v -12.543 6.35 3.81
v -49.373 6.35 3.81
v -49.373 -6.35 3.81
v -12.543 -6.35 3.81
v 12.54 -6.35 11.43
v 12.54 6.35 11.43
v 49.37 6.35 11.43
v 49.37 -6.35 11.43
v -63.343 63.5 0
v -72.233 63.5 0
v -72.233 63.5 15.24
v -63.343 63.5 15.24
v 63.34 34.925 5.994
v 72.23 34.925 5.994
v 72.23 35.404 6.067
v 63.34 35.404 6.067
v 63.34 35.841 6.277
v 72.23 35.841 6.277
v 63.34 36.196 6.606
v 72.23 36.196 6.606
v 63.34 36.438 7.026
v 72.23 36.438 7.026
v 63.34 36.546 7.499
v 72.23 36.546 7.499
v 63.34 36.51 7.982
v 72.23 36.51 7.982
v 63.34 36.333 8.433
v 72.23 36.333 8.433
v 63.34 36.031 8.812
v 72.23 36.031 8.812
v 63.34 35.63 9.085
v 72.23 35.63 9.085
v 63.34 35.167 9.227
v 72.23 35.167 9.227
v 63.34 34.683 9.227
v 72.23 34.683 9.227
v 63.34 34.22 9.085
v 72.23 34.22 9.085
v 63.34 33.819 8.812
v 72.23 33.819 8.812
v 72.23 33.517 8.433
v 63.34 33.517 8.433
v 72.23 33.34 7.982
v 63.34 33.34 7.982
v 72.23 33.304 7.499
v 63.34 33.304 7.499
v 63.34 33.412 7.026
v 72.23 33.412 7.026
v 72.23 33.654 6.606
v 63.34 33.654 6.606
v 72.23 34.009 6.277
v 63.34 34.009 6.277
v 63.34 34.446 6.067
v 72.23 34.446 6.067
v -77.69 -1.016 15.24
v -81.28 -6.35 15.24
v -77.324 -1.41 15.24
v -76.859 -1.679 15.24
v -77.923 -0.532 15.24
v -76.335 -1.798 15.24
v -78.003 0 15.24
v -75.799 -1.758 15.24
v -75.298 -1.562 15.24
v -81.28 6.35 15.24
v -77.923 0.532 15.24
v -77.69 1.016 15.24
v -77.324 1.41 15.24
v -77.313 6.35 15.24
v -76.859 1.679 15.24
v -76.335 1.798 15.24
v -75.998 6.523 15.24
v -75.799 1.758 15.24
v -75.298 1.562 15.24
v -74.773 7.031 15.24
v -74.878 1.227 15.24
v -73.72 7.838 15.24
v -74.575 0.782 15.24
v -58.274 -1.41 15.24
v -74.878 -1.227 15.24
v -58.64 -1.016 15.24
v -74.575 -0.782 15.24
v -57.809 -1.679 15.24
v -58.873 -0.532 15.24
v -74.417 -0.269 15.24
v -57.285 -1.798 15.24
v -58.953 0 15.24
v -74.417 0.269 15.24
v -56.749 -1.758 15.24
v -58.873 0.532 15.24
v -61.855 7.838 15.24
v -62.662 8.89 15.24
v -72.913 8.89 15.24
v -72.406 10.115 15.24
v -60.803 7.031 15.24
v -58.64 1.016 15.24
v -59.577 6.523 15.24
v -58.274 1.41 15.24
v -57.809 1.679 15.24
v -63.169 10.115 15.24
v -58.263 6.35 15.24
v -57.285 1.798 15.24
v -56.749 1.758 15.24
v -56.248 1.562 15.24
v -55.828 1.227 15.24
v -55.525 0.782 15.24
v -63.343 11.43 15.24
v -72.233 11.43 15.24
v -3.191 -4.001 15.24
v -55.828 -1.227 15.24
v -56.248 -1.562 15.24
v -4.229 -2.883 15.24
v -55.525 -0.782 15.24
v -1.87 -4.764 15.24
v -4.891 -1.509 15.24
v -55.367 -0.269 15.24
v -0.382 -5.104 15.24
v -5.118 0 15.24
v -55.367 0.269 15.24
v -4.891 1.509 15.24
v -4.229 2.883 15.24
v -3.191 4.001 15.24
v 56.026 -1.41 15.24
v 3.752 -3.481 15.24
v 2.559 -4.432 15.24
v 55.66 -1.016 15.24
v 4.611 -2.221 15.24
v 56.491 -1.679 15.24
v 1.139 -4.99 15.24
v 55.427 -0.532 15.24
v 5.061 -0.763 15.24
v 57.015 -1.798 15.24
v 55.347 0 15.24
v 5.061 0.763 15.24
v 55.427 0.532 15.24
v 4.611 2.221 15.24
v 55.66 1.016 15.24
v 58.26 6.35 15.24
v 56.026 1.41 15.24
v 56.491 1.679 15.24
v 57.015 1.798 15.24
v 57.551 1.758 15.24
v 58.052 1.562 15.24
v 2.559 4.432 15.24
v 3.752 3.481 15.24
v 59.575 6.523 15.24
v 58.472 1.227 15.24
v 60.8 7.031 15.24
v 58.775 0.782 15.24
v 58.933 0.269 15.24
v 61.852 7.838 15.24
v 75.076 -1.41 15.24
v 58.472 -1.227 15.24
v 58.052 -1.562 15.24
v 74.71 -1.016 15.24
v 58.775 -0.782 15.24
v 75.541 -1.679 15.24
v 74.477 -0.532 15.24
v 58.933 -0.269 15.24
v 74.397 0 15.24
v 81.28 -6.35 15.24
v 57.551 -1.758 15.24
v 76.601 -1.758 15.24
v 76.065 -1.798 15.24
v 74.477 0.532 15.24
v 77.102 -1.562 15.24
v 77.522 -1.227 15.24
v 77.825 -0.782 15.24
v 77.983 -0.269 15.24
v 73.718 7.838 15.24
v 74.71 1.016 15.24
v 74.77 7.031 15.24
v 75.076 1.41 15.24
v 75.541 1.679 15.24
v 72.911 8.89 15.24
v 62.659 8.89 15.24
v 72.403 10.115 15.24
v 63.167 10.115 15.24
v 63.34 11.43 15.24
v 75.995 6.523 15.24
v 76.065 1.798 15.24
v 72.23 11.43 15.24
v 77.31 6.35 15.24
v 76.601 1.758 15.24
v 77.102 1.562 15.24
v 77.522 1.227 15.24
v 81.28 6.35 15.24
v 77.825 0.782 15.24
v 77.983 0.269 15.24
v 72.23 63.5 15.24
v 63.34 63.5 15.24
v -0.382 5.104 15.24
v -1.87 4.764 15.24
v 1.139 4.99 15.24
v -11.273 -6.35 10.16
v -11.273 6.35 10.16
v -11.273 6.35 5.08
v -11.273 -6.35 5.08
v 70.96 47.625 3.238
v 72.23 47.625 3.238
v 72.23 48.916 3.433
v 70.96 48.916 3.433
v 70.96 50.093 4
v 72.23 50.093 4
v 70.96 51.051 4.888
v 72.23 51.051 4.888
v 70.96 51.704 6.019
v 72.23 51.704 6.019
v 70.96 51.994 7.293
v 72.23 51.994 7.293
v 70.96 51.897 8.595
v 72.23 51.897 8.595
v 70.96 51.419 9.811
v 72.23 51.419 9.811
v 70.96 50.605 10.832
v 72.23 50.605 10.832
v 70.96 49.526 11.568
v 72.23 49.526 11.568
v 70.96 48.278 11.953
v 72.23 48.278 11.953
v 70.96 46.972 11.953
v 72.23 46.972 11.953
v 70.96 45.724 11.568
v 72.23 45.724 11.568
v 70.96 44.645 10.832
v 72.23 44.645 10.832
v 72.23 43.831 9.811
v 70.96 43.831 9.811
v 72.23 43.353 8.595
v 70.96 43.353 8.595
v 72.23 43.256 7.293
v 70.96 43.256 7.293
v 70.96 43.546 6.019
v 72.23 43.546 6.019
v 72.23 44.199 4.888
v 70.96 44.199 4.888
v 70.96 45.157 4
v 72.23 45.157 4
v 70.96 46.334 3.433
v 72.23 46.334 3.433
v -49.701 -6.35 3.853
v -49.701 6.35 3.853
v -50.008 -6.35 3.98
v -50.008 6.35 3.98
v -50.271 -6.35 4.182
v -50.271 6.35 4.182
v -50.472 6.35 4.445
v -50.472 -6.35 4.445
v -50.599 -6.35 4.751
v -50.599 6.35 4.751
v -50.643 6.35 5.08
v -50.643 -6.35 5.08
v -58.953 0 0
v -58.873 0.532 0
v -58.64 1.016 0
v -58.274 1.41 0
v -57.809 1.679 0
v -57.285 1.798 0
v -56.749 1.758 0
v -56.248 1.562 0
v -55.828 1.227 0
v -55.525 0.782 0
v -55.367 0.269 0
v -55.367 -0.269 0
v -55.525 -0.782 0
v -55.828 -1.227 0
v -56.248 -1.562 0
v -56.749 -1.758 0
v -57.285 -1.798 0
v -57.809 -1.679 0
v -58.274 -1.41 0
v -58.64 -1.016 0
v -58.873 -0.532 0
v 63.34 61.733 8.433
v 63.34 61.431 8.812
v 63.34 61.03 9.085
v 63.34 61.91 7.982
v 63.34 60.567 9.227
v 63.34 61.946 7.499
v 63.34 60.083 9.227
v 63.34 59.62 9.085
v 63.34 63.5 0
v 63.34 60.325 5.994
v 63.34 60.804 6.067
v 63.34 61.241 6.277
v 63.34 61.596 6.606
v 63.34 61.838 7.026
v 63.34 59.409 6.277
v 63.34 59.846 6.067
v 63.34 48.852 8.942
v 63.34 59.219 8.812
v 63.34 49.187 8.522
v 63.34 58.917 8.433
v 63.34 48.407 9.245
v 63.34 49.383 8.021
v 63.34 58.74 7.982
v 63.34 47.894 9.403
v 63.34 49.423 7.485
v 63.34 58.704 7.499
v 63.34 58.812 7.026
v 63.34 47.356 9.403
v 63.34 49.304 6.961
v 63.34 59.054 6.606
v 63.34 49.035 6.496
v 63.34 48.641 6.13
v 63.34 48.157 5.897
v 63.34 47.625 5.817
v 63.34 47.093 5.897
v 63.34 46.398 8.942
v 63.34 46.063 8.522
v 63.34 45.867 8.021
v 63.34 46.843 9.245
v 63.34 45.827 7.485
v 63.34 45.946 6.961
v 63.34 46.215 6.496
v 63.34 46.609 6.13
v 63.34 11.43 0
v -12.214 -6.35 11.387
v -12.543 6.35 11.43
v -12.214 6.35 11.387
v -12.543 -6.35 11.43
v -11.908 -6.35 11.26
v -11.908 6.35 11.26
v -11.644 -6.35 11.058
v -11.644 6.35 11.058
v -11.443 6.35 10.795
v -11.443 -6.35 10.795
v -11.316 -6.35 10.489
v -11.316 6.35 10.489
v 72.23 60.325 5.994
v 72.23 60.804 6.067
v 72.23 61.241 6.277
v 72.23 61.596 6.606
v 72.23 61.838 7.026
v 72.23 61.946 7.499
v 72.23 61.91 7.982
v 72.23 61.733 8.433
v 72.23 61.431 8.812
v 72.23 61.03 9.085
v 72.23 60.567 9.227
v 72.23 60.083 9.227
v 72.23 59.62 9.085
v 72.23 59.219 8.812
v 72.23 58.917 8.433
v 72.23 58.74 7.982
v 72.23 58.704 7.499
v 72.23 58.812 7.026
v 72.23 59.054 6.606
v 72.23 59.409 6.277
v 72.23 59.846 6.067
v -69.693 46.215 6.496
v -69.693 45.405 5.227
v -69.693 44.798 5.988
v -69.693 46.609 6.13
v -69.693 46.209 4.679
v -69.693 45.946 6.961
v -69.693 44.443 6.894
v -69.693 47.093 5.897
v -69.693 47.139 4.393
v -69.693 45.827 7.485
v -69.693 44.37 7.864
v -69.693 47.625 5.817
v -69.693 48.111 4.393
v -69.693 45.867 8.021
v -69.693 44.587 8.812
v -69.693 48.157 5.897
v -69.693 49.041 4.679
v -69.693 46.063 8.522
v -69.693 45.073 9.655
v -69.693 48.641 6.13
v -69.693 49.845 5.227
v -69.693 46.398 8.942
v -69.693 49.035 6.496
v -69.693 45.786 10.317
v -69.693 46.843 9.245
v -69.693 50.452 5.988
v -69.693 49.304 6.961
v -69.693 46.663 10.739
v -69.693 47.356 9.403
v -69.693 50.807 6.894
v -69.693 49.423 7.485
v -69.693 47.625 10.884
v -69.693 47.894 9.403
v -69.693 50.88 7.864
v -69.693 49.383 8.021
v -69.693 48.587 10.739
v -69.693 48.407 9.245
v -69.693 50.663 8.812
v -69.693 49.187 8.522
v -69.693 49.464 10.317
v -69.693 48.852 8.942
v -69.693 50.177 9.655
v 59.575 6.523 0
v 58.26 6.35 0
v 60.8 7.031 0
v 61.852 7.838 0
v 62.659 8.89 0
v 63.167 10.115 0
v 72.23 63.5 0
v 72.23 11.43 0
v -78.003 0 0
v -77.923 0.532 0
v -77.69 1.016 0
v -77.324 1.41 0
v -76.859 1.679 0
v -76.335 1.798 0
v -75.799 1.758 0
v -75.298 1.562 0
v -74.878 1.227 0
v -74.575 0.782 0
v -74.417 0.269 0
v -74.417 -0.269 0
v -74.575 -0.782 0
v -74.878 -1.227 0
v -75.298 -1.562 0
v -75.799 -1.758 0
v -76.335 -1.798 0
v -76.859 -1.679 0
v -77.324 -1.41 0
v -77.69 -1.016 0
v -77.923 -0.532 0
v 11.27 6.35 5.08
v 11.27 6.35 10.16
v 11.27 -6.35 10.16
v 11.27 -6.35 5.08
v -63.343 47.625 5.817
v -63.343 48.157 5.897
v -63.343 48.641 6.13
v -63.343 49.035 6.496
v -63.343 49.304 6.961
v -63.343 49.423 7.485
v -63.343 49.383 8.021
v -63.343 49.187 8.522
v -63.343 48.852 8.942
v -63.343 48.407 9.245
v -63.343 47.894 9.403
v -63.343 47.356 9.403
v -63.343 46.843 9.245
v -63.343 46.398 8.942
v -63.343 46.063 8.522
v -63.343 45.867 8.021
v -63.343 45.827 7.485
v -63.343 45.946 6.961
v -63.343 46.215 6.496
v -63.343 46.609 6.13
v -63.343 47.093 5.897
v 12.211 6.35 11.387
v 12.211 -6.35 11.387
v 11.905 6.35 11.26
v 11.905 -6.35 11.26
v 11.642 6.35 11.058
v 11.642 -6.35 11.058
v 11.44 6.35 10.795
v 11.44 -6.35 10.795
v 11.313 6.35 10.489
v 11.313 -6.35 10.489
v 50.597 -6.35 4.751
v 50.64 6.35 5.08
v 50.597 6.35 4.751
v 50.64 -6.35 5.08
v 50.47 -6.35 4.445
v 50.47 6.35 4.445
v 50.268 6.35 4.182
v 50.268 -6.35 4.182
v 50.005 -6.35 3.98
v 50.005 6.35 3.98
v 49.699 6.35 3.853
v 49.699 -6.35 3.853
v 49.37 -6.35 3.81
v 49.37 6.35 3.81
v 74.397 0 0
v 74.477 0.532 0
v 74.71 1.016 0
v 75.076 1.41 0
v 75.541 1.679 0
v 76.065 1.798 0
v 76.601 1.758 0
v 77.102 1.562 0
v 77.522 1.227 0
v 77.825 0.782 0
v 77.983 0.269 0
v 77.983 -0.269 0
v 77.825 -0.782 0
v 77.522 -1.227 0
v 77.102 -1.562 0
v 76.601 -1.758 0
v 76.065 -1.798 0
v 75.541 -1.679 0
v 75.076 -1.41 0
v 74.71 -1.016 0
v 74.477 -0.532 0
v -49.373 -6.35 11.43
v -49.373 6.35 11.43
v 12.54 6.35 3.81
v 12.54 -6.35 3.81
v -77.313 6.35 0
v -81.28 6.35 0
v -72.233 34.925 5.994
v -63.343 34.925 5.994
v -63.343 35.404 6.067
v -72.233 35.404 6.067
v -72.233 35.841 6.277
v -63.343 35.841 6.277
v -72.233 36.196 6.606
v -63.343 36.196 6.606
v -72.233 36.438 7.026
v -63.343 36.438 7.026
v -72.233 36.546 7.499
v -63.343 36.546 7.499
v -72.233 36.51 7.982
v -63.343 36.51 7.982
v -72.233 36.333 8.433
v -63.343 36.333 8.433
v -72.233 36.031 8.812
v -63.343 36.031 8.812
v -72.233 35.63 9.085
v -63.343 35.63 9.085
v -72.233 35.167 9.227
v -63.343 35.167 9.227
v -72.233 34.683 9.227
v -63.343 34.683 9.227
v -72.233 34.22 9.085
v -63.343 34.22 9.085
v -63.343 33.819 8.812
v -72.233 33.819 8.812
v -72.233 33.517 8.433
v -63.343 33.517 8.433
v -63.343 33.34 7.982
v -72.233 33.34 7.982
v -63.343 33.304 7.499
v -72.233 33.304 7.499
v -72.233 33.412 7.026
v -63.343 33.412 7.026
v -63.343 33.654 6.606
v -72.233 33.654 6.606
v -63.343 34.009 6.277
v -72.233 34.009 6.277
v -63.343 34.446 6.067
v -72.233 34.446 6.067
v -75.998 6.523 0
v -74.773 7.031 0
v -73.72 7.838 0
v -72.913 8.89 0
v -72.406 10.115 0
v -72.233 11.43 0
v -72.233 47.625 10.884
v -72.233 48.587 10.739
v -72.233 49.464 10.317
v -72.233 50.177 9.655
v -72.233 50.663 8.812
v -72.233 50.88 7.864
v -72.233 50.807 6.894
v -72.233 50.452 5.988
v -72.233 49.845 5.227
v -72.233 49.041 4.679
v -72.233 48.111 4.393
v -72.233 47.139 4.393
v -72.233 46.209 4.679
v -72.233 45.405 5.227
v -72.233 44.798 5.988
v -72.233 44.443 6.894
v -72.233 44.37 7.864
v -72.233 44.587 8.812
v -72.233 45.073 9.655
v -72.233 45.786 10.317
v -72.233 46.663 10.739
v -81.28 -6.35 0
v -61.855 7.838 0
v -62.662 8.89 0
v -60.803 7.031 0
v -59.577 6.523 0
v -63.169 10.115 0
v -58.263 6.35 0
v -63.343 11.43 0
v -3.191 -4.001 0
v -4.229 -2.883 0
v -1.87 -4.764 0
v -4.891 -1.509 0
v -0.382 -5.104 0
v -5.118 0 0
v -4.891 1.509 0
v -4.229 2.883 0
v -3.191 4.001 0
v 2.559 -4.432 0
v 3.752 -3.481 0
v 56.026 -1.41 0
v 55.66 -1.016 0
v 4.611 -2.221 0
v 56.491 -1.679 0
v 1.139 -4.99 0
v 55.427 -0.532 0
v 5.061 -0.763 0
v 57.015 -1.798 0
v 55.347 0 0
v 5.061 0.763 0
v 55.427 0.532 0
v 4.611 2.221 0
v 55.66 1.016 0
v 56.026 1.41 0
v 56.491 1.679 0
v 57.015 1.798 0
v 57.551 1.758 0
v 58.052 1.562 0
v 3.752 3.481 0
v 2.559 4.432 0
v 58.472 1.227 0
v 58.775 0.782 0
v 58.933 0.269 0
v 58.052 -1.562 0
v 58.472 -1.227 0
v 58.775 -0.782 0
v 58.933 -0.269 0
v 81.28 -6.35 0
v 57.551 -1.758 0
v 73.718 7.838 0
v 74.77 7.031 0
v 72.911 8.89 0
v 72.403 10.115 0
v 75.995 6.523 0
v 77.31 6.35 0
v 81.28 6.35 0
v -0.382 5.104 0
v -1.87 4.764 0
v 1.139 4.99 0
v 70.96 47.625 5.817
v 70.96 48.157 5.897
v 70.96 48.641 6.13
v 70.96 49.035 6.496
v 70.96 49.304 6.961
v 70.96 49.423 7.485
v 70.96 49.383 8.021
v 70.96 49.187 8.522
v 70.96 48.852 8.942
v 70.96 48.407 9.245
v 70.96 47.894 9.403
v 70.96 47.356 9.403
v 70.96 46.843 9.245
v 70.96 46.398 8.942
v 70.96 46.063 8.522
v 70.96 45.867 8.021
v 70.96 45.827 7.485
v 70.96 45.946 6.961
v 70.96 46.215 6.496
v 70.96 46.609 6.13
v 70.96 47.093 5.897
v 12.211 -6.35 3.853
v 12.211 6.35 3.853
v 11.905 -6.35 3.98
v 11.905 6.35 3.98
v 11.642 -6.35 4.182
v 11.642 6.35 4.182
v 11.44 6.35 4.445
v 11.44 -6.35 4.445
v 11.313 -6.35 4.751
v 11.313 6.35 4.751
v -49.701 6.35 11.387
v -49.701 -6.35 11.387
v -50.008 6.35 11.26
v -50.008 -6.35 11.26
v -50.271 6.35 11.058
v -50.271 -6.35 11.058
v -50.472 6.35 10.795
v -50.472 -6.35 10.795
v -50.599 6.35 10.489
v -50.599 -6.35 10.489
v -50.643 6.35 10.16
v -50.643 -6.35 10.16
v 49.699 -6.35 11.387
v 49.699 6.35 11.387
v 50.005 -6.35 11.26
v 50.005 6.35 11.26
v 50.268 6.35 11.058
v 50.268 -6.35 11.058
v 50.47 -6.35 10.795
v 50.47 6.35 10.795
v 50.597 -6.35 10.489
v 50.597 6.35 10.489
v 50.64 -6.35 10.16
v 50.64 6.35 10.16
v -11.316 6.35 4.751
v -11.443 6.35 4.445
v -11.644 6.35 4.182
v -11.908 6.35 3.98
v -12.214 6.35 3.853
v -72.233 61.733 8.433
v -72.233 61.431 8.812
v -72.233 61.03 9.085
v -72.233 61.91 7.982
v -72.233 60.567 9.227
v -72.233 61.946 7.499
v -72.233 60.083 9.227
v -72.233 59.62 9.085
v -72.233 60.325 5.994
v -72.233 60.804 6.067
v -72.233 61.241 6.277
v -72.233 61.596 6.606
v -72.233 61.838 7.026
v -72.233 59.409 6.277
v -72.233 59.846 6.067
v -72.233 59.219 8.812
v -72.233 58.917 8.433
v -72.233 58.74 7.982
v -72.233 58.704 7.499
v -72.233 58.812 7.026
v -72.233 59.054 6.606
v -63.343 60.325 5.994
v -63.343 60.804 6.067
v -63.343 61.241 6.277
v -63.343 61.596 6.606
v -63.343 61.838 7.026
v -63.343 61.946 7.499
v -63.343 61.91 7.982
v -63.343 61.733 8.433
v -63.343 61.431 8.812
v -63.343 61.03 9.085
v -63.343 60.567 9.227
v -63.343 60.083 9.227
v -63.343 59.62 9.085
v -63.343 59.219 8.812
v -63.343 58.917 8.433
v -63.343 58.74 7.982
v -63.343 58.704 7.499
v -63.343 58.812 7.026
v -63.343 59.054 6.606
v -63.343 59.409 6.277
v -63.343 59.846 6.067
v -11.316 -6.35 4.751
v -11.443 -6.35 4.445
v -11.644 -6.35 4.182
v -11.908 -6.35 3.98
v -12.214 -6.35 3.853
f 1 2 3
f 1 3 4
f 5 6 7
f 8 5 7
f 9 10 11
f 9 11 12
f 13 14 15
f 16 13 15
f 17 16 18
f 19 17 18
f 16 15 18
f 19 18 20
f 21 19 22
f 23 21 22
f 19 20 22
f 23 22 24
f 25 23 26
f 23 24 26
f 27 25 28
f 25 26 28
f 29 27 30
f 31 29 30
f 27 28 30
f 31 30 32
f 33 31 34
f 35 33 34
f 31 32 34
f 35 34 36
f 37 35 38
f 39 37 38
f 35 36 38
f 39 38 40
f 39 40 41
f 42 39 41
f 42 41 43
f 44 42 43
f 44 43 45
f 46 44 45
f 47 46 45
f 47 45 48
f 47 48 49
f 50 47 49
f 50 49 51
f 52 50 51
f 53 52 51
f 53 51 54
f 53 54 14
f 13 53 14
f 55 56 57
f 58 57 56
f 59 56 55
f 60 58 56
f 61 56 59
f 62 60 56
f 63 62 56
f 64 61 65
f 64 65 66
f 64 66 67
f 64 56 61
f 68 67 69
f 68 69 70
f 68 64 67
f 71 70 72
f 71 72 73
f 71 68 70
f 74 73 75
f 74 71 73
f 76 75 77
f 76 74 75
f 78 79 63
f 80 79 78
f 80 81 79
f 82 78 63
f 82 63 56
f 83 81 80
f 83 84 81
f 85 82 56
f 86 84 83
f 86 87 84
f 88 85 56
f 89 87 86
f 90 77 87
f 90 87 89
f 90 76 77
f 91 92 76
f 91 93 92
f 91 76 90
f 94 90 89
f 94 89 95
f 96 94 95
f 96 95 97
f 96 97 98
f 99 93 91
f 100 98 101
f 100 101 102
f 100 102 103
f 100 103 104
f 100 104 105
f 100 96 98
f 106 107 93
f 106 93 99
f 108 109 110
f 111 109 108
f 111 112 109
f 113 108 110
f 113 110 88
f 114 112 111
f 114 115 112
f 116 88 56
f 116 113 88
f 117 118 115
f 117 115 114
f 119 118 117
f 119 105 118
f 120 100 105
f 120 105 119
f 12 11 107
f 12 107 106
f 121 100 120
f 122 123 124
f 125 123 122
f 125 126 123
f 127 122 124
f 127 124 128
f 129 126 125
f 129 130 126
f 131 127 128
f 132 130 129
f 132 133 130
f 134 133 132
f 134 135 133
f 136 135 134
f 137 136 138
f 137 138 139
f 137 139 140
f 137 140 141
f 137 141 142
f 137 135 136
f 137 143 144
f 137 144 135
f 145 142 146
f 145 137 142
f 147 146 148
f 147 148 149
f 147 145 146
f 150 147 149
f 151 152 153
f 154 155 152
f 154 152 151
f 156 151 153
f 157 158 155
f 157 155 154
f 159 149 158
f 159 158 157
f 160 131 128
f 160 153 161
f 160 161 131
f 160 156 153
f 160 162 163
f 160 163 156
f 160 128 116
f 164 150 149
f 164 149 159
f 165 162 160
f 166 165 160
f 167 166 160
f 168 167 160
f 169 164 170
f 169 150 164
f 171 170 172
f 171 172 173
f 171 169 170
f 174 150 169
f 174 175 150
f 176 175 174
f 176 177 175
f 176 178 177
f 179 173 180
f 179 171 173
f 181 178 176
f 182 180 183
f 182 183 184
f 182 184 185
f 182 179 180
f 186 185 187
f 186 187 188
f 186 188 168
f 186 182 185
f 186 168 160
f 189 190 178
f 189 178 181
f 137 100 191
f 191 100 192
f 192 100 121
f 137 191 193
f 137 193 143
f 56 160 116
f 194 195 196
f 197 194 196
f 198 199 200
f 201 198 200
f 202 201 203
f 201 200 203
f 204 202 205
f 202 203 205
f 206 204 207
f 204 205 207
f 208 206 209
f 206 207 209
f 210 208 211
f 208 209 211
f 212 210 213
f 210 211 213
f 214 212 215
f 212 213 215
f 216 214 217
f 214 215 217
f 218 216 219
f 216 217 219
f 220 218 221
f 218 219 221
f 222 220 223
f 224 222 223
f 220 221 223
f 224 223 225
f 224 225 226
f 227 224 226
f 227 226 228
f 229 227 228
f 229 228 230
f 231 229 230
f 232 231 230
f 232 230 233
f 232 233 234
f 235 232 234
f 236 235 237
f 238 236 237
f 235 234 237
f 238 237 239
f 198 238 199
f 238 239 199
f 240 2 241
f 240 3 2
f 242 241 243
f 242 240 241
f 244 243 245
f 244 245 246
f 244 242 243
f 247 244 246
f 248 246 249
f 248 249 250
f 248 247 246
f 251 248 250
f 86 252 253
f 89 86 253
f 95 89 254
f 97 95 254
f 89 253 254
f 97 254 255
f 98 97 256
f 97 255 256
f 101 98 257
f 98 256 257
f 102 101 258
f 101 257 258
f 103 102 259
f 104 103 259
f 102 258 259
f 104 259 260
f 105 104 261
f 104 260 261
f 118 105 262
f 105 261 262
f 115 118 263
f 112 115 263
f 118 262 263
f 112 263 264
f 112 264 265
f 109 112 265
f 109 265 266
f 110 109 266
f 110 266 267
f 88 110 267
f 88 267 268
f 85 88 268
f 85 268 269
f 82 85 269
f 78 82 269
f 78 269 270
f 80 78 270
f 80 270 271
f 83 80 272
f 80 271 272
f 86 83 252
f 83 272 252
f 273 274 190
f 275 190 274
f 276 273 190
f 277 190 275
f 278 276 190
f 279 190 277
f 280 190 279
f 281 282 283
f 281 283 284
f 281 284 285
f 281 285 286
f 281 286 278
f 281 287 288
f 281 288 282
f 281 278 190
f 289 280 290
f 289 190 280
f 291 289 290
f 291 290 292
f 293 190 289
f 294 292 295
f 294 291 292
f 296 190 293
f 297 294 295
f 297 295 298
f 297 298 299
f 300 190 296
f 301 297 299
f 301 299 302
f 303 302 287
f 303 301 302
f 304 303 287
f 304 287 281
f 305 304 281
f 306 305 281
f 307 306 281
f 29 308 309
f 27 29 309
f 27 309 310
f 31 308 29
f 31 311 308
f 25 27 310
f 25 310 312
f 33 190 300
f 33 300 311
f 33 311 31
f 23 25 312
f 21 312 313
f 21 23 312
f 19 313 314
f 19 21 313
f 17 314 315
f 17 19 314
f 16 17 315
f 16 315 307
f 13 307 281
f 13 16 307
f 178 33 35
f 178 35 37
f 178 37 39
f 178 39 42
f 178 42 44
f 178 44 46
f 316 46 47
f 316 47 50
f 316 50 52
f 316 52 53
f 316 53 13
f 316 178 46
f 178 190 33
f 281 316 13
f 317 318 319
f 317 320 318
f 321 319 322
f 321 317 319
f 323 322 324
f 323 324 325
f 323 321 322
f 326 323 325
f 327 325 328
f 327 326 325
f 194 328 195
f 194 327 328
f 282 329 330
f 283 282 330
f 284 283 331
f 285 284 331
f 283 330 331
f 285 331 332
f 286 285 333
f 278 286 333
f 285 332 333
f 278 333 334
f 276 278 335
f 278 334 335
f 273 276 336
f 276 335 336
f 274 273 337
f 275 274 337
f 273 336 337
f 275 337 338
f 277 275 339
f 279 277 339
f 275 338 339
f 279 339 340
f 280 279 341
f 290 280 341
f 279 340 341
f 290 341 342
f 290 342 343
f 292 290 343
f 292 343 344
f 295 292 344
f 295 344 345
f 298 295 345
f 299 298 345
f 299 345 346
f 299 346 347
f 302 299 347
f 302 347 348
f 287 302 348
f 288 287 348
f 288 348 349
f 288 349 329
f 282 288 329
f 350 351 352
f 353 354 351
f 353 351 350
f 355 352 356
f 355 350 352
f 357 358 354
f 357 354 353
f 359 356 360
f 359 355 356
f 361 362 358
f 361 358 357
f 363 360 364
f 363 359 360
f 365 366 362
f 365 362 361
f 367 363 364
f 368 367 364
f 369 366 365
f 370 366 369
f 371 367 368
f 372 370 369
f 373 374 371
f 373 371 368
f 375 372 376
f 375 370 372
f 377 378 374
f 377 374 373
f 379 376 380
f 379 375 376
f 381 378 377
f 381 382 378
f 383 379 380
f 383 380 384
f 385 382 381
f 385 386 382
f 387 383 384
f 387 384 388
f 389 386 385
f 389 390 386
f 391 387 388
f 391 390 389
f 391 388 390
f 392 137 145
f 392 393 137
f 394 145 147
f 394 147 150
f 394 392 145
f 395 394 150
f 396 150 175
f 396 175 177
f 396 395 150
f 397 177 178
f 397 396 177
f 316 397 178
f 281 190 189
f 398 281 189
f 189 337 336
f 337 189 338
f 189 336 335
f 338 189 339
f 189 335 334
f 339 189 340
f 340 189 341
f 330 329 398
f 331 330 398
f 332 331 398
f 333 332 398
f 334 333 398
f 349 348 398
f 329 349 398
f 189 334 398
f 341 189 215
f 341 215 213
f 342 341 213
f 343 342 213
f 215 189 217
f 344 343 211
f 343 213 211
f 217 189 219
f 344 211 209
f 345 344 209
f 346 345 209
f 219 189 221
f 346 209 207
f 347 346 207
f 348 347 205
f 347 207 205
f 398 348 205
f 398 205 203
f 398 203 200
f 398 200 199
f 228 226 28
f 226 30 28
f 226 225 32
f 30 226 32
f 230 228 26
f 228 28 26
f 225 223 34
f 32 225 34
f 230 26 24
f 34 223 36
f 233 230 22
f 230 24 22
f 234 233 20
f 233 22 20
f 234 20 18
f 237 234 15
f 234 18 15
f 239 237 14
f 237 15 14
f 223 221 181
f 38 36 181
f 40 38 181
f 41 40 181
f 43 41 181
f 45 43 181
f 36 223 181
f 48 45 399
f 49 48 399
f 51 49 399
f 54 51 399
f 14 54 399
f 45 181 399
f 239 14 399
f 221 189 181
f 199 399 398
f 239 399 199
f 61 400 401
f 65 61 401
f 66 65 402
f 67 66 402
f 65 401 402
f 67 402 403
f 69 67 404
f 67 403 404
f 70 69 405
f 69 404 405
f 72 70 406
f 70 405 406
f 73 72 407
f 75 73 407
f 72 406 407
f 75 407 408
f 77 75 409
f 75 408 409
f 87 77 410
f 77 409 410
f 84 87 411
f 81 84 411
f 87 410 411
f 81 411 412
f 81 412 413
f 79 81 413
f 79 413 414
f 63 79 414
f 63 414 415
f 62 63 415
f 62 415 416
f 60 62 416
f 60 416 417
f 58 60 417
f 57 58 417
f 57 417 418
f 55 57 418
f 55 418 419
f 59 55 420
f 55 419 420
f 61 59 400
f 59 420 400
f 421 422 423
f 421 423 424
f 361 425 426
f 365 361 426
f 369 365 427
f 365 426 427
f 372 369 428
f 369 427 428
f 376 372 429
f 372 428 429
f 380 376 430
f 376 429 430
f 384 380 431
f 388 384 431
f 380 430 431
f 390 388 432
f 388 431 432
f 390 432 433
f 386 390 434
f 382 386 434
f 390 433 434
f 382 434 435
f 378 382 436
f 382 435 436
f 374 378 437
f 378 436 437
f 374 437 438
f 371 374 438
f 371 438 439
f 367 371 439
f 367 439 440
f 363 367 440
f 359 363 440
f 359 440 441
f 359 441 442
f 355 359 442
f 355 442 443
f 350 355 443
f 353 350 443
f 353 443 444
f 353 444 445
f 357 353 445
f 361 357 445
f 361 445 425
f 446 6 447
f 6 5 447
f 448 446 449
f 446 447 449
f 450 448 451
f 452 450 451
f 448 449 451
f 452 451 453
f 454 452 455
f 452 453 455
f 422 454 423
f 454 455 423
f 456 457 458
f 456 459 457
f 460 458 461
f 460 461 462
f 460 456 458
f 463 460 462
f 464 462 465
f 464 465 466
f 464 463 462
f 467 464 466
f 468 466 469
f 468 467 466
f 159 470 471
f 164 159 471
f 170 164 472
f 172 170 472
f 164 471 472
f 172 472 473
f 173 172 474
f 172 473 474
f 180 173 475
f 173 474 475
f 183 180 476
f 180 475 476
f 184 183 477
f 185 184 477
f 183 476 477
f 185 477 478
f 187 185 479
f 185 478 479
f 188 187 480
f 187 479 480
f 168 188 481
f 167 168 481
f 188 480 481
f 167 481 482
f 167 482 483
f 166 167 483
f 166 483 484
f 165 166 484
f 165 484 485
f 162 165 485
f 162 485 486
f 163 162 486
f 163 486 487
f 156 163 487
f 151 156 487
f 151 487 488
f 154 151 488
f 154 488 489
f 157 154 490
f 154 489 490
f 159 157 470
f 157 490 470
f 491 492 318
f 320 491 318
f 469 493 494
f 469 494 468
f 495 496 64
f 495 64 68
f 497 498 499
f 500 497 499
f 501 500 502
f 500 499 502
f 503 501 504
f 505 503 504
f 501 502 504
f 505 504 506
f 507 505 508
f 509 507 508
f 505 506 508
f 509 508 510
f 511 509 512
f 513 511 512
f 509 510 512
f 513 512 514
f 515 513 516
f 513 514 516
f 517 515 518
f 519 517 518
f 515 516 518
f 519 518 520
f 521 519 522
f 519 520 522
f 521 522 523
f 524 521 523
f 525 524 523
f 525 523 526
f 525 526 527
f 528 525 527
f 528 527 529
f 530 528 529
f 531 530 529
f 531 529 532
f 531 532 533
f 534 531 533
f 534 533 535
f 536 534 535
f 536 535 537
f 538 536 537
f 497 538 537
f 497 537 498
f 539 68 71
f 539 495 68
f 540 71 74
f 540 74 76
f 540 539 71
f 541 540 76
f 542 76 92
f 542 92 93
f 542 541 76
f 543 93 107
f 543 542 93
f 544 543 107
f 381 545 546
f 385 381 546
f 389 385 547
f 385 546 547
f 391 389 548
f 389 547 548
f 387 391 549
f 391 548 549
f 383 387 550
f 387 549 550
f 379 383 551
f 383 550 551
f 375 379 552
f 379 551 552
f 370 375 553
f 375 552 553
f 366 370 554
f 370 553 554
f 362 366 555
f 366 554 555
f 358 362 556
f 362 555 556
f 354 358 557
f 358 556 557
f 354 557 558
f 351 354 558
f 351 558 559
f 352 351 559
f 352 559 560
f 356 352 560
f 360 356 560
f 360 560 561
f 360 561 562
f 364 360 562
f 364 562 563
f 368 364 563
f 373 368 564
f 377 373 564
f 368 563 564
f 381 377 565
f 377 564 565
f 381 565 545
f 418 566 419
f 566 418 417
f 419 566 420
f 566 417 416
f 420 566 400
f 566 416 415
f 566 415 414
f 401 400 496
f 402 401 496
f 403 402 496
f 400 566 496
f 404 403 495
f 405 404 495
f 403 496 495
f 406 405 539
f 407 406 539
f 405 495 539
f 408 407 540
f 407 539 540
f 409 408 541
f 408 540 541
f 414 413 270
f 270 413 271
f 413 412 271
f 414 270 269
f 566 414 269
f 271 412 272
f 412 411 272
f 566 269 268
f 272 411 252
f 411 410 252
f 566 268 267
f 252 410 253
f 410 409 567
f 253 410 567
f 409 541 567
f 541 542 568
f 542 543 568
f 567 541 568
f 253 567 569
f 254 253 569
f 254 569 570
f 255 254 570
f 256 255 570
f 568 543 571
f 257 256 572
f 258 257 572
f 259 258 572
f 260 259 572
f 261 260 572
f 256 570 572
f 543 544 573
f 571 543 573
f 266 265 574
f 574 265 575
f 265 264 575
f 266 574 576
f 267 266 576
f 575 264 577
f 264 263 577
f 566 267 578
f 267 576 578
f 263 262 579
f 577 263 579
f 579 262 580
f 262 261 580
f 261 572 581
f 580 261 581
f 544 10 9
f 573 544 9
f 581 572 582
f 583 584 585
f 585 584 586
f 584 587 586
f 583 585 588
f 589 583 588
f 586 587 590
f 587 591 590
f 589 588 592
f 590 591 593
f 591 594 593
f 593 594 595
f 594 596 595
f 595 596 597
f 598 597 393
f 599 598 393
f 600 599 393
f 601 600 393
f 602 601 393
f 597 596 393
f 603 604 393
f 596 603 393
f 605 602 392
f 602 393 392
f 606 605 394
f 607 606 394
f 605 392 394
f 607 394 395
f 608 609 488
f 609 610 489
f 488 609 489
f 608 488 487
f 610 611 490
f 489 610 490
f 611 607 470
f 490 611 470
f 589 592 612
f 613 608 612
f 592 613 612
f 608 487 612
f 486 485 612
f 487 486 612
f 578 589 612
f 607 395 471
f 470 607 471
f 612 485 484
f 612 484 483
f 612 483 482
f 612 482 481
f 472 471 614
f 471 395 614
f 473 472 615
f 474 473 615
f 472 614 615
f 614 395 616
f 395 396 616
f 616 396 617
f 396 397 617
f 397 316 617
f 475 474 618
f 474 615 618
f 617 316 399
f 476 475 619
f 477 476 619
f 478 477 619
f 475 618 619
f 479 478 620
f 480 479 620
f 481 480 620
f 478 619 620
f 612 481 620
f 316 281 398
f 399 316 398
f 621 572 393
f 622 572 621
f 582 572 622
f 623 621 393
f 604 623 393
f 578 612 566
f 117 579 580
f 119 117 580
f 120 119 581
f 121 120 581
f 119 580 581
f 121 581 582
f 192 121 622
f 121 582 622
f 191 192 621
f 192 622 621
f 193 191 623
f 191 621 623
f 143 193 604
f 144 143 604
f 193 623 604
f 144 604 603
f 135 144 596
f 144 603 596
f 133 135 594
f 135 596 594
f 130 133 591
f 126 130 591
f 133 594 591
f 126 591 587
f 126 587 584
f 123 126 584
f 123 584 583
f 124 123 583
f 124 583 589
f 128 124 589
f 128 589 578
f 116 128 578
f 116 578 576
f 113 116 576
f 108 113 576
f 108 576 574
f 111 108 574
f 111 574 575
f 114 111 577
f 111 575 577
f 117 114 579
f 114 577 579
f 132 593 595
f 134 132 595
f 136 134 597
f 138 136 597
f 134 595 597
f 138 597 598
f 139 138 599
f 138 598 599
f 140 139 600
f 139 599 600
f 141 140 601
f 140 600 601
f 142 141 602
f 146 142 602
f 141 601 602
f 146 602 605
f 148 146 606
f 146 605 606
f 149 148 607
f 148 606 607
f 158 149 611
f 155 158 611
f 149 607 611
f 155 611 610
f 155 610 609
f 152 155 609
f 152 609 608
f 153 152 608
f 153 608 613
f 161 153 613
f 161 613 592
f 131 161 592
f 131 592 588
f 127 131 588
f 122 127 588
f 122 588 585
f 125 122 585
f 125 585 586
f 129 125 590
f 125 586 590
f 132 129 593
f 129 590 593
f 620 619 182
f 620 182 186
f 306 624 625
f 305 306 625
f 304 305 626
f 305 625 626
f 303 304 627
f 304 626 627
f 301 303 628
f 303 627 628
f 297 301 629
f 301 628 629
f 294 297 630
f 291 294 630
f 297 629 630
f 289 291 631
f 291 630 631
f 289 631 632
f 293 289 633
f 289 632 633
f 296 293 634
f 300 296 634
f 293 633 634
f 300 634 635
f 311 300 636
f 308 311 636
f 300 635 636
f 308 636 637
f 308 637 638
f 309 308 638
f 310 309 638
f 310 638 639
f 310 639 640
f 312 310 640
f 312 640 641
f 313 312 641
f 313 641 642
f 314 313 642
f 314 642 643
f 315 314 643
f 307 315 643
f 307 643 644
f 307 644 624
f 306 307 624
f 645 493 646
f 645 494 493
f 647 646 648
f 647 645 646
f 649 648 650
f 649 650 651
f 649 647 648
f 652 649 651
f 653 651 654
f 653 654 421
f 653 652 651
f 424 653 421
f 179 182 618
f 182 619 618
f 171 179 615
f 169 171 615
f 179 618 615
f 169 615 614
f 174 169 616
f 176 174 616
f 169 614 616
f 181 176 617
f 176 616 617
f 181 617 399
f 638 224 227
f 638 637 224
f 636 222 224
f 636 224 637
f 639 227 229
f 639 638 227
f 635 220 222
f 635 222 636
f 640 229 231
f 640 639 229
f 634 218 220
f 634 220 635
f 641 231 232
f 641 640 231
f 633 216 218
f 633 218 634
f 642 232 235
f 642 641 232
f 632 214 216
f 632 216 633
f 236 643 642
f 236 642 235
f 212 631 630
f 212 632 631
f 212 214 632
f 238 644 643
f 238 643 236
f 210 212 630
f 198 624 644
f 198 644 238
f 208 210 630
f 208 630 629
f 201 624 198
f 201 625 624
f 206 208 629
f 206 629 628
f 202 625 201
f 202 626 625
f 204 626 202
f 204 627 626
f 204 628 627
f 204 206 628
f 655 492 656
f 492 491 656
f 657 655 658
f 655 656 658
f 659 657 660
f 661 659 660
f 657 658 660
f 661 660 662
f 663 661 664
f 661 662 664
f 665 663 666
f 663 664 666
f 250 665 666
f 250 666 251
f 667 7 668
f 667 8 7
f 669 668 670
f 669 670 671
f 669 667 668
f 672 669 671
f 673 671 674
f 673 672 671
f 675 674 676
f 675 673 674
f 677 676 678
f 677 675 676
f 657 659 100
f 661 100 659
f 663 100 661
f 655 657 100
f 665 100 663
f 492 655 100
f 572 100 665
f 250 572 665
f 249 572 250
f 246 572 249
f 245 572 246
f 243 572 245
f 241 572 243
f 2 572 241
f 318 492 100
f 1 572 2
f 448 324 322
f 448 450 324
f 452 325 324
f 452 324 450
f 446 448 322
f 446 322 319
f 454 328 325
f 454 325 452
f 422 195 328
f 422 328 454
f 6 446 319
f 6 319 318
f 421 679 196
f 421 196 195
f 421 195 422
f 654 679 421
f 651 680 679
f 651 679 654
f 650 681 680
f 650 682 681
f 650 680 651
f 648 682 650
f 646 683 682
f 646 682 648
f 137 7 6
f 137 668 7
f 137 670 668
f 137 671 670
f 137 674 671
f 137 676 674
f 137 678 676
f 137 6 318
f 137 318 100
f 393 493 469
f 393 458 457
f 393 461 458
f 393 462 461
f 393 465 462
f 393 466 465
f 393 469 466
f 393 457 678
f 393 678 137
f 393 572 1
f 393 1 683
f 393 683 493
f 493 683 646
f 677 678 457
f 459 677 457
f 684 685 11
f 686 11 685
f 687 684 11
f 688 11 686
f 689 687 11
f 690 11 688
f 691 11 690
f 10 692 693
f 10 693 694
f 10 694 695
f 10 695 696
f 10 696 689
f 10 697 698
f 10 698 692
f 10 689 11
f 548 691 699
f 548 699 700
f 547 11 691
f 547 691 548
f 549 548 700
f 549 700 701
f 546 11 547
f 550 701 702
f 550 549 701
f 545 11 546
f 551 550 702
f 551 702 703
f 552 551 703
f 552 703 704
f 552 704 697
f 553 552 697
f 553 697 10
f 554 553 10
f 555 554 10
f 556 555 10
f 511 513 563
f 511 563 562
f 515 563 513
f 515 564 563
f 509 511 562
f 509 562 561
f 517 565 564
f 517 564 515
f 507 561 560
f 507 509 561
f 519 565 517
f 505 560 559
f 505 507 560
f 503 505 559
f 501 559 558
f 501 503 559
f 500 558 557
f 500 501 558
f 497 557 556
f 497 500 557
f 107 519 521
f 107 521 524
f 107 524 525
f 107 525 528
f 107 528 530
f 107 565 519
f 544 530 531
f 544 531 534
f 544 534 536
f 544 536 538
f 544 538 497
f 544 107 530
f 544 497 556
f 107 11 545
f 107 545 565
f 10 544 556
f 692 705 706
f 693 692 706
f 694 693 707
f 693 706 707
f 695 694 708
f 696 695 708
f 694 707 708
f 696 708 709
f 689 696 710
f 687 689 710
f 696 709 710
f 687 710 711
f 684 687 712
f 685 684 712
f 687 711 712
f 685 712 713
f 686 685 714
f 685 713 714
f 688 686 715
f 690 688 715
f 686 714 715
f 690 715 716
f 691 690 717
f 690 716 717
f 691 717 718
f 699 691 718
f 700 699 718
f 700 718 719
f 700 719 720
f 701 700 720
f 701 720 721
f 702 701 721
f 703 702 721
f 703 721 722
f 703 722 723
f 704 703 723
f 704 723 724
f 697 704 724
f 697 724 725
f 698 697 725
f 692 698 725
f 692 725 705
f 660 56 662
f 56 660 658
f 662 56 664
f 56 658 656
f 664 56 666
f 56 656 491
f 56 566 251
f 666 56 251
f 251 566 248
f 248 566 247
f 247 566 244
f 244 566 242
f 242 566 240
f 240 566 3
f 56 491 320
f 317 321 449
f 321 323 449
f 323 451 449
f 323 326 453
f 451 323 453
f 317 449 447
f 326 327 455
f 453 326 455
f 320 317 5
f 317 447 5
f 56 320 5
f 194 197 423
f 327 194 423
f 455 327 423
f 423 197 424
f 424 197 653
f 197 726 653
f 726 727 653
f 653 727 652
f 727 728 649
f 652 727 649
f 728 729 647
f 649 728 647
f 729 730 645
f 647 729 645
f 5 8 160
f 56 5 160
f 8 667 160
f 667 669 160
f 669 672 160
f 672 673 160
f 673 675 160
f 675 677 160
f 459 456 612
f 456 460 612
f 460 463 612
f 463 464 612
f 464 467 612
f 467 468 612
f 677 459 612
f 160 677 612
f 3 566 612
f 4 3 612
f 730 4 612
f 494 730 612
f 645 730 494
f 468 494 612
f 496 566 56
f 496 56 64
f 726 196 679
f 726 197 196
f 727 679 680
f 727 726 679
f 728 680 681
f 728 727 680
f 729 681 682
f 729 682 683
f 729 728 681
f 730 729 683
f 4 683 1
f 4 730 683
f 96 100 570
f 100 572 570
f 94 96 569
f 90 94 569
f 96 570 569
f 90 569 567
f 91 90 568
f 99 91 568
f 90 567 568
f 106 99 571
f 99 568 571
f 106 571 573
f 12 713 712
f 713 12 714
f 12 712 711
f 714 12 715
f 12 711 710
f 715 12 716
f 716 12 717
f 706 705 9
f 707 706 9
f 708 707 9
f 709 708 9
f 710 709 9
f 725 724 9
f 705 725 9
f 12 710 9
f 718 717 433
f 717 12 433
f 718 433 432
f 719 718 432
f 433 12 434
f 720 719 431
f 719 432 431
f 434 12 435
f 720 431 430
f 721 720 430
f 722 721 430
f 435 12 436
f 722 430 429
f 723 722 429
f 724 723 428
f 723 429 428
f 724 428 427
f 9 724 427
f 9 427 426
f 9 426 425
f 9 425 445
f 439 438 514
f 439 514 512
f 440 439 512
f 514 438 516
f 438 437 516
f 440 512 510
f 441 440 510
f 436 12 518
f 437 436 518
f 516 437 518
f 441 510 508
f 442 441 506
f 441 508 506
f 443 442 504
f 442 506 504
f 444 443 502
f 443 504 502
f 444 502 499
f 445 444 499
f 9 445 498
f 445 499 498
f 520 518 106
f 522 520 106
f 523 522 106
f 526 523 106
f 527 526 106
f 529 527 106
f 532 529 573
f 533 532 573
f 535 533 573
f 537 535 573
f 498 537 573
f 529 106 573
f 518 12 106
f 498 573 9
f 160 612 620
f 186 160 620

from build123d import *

# Parameters (mm, degrees)
SKETCH1_W           = 162.56
SKETCH1_H           = 12.7
BOSS_EXTRUDE1_DEPTH = 15.24
SKETCH2_R           = 1.8034
CUT_EXTRUDE1_DEPTH  = 15.24
SKETCH3_R           = 5.1181
CUT_EXTRUDE2_DEPTH  = 15.24
SKETCH4_W           = 8.89
SKETCH4_H           = 15.24
BOSS_EXTRUDE2_DEPTH = 57.15
FILLET1_R           = 5.08
SKETCH5_R           = 1.6256
SKETCH5_R_2         = 1.8034
CUT_EXTRUDE3_DEPTH  = 152.4
SKETCH6_R           = 4.3815
CUT_EXTRUDE4_DEPTH  = 1.27
SKETCH7_R           = 3.2639
CUT_EXTRUDE5_DEPTH  = 2.54
SKETCH8_W           = 39.37
SKETCH8_H           = 7.62
CUT_EXTRUDE6_DEPTH  = 25.4
FILLET2_R           = 1.27
FILLET3_R           = 1.27


with BuildPart() as part:
    # Sketch1 → Boss-Extrude1 (new body)
    with BuildSketch(Plane.XY):
        Rectangle(SKETCH1_W, SKETCH1_H)
    extrude(amount=BOSS_EXTRUDE1_DEPTH)

    # Sketch2 → Cut-Extrude1 (cut)
    with BuildSketch(Plane(origin=(0, 0, 0), x_dir=(-1, 0, 0), z_dir=(0, 0, -1))):
        with Locations((-76.2, 0)):
            Circle(SKETCH2_R)
        with Locations((-57.15, 0)):
            Circle(SKETCH2_R)
        with Locations((57.15, 0)):
            Circle(SKETCH2_R)
        with Locations((76.2, 0)):
            Circle(SKETCH2_R)
    extrude(amount=-CUT_EXTRUDE1_DEPTH, mode=Mode.SUBTRACT)

    # Sketch3 → Cut-Extrude2 (cut)
    with BuildSketch(Plane(origin=(0, 0, 0), x_dir=(-1, 0, 0), z_dir=(0, 0, -1))):
        Circle(SKETCH3_R)
    extrude(amount=-CUT_EXTRUDE2_DEPTH, mode=Mode.SUBTRACT)

    # Sketch4 → Boss-Extrude2 (add)
    with BuildSketch(Plane(origin=(0, 6.35, 0), x_dir=(1, 0, 0), z_dir=(0, 1, 0))):
        with Locations((67.78498, -7.62)):
            Rectangle(SKETCH4_W, SKETCH4_H)
        with Locations((-67.78752, -7.62)):
            Rectangle(SKETCH4_W, SKETCH4_H)
    extrude(amount=BOSS_EXTRUDE2_DEPTH)

    # Fillet1
    fillet1_edges = [part.edges().sort_by_distance(p)[0] for p in [
        (72.22998, 6.35, 7.62),
        (63.33998, 6.35, 7.62),
        (-63.34252, 6.35, 7.62),
        (-72.23252, 6.35, 7.62),
    ]]
    fillet(fillet1_edges, radius=FILLET1_R)

    # Sketch5 → Cut-Extrude3 (cut)
    with BuildSketch(Plane(origin=(72.22998, 0, 0), x_dir=(0, 0, -1), z_dir=(1, 0, 0))):
        with Locations((-7.62, 60.325)):
            Circle(SKETCH5_R)
        with Locations((-7.62, 34.925)):
            Circle(SKETCH5_R)
        with Locations((-7.62, 47.625)):
            Circle(SKETCH5_R_2)
    extrude(amount=-CUT_EXTRUDE3_DEPTH, mode=Mode.SUBTRACT)

    # Sketch6 → Cut-Extrude4 (cut)
    with BuildSketch(Plane(origin=(72.22998, 0, 0), x_dir=(0, 0, -1), z_dir=(1, 0, 0))):
        with Locations((-7.62, 47.625)):
            Circle(SKETCH6_R)
    extrude(amount=-CUT_EXTRUDE4_DEPTH, mode=Mode.SUBTRACT)

    # Sketch7 → Cut-Extrude5 (cut)
    with BuildSketch(Plane.ZY.offset(72.23252)):
        with Locations((7.62, 47.625)):
            Circle(SKETCH7_R)
    extrude(amount=-CUT_EXTRUDE5_DEPTH, mode=Mode.SUBTRACT)

    # Sketch8 → Cut-Extrude6 (cut)
    with BuildSketch(Plane(origin=(0, 6.35, 0), x_dir=(1, 0, 0), z_dir=(0, 1, 0))):
        with Locations((30.95498, -7.62)):
            Rectangle(SKETCH8_W, SKETCH8_H)
        with Locations((-30.95752, -7.62)):
            Rectangle(SKETCH8_W, SKETCH8_H)
    extrude(amount=-CUT_EXTRUDE6_DEPTH, mode=Mode.SUBTRACT)

    # Fillet2
    fillet2_edges = [part.edges().sort_by_distance(p)[0] for p in [
        (11.26998, 0, 11.43),
        (11.26998, 0, 3.81),
        (50.63998, 0, 3.81),
        (50.63998, 0, 11.43),
    ]]
    fillet(fillet2_edges, radius=FILLET2_R)

    # Fillet3
    fillet3_edges = [part.edges().sort_by_distance(p)[0] for p in [
        (-50.64252, 0, 11.43),
        (-50.64252, 0, 3.81),
        (-11.27252, 0, 3.81),
        (-11.27252, 0, 11.43),
    ]]
    fillet(fillet3_edges, radius=FILLET3_R)


solid = part.part
